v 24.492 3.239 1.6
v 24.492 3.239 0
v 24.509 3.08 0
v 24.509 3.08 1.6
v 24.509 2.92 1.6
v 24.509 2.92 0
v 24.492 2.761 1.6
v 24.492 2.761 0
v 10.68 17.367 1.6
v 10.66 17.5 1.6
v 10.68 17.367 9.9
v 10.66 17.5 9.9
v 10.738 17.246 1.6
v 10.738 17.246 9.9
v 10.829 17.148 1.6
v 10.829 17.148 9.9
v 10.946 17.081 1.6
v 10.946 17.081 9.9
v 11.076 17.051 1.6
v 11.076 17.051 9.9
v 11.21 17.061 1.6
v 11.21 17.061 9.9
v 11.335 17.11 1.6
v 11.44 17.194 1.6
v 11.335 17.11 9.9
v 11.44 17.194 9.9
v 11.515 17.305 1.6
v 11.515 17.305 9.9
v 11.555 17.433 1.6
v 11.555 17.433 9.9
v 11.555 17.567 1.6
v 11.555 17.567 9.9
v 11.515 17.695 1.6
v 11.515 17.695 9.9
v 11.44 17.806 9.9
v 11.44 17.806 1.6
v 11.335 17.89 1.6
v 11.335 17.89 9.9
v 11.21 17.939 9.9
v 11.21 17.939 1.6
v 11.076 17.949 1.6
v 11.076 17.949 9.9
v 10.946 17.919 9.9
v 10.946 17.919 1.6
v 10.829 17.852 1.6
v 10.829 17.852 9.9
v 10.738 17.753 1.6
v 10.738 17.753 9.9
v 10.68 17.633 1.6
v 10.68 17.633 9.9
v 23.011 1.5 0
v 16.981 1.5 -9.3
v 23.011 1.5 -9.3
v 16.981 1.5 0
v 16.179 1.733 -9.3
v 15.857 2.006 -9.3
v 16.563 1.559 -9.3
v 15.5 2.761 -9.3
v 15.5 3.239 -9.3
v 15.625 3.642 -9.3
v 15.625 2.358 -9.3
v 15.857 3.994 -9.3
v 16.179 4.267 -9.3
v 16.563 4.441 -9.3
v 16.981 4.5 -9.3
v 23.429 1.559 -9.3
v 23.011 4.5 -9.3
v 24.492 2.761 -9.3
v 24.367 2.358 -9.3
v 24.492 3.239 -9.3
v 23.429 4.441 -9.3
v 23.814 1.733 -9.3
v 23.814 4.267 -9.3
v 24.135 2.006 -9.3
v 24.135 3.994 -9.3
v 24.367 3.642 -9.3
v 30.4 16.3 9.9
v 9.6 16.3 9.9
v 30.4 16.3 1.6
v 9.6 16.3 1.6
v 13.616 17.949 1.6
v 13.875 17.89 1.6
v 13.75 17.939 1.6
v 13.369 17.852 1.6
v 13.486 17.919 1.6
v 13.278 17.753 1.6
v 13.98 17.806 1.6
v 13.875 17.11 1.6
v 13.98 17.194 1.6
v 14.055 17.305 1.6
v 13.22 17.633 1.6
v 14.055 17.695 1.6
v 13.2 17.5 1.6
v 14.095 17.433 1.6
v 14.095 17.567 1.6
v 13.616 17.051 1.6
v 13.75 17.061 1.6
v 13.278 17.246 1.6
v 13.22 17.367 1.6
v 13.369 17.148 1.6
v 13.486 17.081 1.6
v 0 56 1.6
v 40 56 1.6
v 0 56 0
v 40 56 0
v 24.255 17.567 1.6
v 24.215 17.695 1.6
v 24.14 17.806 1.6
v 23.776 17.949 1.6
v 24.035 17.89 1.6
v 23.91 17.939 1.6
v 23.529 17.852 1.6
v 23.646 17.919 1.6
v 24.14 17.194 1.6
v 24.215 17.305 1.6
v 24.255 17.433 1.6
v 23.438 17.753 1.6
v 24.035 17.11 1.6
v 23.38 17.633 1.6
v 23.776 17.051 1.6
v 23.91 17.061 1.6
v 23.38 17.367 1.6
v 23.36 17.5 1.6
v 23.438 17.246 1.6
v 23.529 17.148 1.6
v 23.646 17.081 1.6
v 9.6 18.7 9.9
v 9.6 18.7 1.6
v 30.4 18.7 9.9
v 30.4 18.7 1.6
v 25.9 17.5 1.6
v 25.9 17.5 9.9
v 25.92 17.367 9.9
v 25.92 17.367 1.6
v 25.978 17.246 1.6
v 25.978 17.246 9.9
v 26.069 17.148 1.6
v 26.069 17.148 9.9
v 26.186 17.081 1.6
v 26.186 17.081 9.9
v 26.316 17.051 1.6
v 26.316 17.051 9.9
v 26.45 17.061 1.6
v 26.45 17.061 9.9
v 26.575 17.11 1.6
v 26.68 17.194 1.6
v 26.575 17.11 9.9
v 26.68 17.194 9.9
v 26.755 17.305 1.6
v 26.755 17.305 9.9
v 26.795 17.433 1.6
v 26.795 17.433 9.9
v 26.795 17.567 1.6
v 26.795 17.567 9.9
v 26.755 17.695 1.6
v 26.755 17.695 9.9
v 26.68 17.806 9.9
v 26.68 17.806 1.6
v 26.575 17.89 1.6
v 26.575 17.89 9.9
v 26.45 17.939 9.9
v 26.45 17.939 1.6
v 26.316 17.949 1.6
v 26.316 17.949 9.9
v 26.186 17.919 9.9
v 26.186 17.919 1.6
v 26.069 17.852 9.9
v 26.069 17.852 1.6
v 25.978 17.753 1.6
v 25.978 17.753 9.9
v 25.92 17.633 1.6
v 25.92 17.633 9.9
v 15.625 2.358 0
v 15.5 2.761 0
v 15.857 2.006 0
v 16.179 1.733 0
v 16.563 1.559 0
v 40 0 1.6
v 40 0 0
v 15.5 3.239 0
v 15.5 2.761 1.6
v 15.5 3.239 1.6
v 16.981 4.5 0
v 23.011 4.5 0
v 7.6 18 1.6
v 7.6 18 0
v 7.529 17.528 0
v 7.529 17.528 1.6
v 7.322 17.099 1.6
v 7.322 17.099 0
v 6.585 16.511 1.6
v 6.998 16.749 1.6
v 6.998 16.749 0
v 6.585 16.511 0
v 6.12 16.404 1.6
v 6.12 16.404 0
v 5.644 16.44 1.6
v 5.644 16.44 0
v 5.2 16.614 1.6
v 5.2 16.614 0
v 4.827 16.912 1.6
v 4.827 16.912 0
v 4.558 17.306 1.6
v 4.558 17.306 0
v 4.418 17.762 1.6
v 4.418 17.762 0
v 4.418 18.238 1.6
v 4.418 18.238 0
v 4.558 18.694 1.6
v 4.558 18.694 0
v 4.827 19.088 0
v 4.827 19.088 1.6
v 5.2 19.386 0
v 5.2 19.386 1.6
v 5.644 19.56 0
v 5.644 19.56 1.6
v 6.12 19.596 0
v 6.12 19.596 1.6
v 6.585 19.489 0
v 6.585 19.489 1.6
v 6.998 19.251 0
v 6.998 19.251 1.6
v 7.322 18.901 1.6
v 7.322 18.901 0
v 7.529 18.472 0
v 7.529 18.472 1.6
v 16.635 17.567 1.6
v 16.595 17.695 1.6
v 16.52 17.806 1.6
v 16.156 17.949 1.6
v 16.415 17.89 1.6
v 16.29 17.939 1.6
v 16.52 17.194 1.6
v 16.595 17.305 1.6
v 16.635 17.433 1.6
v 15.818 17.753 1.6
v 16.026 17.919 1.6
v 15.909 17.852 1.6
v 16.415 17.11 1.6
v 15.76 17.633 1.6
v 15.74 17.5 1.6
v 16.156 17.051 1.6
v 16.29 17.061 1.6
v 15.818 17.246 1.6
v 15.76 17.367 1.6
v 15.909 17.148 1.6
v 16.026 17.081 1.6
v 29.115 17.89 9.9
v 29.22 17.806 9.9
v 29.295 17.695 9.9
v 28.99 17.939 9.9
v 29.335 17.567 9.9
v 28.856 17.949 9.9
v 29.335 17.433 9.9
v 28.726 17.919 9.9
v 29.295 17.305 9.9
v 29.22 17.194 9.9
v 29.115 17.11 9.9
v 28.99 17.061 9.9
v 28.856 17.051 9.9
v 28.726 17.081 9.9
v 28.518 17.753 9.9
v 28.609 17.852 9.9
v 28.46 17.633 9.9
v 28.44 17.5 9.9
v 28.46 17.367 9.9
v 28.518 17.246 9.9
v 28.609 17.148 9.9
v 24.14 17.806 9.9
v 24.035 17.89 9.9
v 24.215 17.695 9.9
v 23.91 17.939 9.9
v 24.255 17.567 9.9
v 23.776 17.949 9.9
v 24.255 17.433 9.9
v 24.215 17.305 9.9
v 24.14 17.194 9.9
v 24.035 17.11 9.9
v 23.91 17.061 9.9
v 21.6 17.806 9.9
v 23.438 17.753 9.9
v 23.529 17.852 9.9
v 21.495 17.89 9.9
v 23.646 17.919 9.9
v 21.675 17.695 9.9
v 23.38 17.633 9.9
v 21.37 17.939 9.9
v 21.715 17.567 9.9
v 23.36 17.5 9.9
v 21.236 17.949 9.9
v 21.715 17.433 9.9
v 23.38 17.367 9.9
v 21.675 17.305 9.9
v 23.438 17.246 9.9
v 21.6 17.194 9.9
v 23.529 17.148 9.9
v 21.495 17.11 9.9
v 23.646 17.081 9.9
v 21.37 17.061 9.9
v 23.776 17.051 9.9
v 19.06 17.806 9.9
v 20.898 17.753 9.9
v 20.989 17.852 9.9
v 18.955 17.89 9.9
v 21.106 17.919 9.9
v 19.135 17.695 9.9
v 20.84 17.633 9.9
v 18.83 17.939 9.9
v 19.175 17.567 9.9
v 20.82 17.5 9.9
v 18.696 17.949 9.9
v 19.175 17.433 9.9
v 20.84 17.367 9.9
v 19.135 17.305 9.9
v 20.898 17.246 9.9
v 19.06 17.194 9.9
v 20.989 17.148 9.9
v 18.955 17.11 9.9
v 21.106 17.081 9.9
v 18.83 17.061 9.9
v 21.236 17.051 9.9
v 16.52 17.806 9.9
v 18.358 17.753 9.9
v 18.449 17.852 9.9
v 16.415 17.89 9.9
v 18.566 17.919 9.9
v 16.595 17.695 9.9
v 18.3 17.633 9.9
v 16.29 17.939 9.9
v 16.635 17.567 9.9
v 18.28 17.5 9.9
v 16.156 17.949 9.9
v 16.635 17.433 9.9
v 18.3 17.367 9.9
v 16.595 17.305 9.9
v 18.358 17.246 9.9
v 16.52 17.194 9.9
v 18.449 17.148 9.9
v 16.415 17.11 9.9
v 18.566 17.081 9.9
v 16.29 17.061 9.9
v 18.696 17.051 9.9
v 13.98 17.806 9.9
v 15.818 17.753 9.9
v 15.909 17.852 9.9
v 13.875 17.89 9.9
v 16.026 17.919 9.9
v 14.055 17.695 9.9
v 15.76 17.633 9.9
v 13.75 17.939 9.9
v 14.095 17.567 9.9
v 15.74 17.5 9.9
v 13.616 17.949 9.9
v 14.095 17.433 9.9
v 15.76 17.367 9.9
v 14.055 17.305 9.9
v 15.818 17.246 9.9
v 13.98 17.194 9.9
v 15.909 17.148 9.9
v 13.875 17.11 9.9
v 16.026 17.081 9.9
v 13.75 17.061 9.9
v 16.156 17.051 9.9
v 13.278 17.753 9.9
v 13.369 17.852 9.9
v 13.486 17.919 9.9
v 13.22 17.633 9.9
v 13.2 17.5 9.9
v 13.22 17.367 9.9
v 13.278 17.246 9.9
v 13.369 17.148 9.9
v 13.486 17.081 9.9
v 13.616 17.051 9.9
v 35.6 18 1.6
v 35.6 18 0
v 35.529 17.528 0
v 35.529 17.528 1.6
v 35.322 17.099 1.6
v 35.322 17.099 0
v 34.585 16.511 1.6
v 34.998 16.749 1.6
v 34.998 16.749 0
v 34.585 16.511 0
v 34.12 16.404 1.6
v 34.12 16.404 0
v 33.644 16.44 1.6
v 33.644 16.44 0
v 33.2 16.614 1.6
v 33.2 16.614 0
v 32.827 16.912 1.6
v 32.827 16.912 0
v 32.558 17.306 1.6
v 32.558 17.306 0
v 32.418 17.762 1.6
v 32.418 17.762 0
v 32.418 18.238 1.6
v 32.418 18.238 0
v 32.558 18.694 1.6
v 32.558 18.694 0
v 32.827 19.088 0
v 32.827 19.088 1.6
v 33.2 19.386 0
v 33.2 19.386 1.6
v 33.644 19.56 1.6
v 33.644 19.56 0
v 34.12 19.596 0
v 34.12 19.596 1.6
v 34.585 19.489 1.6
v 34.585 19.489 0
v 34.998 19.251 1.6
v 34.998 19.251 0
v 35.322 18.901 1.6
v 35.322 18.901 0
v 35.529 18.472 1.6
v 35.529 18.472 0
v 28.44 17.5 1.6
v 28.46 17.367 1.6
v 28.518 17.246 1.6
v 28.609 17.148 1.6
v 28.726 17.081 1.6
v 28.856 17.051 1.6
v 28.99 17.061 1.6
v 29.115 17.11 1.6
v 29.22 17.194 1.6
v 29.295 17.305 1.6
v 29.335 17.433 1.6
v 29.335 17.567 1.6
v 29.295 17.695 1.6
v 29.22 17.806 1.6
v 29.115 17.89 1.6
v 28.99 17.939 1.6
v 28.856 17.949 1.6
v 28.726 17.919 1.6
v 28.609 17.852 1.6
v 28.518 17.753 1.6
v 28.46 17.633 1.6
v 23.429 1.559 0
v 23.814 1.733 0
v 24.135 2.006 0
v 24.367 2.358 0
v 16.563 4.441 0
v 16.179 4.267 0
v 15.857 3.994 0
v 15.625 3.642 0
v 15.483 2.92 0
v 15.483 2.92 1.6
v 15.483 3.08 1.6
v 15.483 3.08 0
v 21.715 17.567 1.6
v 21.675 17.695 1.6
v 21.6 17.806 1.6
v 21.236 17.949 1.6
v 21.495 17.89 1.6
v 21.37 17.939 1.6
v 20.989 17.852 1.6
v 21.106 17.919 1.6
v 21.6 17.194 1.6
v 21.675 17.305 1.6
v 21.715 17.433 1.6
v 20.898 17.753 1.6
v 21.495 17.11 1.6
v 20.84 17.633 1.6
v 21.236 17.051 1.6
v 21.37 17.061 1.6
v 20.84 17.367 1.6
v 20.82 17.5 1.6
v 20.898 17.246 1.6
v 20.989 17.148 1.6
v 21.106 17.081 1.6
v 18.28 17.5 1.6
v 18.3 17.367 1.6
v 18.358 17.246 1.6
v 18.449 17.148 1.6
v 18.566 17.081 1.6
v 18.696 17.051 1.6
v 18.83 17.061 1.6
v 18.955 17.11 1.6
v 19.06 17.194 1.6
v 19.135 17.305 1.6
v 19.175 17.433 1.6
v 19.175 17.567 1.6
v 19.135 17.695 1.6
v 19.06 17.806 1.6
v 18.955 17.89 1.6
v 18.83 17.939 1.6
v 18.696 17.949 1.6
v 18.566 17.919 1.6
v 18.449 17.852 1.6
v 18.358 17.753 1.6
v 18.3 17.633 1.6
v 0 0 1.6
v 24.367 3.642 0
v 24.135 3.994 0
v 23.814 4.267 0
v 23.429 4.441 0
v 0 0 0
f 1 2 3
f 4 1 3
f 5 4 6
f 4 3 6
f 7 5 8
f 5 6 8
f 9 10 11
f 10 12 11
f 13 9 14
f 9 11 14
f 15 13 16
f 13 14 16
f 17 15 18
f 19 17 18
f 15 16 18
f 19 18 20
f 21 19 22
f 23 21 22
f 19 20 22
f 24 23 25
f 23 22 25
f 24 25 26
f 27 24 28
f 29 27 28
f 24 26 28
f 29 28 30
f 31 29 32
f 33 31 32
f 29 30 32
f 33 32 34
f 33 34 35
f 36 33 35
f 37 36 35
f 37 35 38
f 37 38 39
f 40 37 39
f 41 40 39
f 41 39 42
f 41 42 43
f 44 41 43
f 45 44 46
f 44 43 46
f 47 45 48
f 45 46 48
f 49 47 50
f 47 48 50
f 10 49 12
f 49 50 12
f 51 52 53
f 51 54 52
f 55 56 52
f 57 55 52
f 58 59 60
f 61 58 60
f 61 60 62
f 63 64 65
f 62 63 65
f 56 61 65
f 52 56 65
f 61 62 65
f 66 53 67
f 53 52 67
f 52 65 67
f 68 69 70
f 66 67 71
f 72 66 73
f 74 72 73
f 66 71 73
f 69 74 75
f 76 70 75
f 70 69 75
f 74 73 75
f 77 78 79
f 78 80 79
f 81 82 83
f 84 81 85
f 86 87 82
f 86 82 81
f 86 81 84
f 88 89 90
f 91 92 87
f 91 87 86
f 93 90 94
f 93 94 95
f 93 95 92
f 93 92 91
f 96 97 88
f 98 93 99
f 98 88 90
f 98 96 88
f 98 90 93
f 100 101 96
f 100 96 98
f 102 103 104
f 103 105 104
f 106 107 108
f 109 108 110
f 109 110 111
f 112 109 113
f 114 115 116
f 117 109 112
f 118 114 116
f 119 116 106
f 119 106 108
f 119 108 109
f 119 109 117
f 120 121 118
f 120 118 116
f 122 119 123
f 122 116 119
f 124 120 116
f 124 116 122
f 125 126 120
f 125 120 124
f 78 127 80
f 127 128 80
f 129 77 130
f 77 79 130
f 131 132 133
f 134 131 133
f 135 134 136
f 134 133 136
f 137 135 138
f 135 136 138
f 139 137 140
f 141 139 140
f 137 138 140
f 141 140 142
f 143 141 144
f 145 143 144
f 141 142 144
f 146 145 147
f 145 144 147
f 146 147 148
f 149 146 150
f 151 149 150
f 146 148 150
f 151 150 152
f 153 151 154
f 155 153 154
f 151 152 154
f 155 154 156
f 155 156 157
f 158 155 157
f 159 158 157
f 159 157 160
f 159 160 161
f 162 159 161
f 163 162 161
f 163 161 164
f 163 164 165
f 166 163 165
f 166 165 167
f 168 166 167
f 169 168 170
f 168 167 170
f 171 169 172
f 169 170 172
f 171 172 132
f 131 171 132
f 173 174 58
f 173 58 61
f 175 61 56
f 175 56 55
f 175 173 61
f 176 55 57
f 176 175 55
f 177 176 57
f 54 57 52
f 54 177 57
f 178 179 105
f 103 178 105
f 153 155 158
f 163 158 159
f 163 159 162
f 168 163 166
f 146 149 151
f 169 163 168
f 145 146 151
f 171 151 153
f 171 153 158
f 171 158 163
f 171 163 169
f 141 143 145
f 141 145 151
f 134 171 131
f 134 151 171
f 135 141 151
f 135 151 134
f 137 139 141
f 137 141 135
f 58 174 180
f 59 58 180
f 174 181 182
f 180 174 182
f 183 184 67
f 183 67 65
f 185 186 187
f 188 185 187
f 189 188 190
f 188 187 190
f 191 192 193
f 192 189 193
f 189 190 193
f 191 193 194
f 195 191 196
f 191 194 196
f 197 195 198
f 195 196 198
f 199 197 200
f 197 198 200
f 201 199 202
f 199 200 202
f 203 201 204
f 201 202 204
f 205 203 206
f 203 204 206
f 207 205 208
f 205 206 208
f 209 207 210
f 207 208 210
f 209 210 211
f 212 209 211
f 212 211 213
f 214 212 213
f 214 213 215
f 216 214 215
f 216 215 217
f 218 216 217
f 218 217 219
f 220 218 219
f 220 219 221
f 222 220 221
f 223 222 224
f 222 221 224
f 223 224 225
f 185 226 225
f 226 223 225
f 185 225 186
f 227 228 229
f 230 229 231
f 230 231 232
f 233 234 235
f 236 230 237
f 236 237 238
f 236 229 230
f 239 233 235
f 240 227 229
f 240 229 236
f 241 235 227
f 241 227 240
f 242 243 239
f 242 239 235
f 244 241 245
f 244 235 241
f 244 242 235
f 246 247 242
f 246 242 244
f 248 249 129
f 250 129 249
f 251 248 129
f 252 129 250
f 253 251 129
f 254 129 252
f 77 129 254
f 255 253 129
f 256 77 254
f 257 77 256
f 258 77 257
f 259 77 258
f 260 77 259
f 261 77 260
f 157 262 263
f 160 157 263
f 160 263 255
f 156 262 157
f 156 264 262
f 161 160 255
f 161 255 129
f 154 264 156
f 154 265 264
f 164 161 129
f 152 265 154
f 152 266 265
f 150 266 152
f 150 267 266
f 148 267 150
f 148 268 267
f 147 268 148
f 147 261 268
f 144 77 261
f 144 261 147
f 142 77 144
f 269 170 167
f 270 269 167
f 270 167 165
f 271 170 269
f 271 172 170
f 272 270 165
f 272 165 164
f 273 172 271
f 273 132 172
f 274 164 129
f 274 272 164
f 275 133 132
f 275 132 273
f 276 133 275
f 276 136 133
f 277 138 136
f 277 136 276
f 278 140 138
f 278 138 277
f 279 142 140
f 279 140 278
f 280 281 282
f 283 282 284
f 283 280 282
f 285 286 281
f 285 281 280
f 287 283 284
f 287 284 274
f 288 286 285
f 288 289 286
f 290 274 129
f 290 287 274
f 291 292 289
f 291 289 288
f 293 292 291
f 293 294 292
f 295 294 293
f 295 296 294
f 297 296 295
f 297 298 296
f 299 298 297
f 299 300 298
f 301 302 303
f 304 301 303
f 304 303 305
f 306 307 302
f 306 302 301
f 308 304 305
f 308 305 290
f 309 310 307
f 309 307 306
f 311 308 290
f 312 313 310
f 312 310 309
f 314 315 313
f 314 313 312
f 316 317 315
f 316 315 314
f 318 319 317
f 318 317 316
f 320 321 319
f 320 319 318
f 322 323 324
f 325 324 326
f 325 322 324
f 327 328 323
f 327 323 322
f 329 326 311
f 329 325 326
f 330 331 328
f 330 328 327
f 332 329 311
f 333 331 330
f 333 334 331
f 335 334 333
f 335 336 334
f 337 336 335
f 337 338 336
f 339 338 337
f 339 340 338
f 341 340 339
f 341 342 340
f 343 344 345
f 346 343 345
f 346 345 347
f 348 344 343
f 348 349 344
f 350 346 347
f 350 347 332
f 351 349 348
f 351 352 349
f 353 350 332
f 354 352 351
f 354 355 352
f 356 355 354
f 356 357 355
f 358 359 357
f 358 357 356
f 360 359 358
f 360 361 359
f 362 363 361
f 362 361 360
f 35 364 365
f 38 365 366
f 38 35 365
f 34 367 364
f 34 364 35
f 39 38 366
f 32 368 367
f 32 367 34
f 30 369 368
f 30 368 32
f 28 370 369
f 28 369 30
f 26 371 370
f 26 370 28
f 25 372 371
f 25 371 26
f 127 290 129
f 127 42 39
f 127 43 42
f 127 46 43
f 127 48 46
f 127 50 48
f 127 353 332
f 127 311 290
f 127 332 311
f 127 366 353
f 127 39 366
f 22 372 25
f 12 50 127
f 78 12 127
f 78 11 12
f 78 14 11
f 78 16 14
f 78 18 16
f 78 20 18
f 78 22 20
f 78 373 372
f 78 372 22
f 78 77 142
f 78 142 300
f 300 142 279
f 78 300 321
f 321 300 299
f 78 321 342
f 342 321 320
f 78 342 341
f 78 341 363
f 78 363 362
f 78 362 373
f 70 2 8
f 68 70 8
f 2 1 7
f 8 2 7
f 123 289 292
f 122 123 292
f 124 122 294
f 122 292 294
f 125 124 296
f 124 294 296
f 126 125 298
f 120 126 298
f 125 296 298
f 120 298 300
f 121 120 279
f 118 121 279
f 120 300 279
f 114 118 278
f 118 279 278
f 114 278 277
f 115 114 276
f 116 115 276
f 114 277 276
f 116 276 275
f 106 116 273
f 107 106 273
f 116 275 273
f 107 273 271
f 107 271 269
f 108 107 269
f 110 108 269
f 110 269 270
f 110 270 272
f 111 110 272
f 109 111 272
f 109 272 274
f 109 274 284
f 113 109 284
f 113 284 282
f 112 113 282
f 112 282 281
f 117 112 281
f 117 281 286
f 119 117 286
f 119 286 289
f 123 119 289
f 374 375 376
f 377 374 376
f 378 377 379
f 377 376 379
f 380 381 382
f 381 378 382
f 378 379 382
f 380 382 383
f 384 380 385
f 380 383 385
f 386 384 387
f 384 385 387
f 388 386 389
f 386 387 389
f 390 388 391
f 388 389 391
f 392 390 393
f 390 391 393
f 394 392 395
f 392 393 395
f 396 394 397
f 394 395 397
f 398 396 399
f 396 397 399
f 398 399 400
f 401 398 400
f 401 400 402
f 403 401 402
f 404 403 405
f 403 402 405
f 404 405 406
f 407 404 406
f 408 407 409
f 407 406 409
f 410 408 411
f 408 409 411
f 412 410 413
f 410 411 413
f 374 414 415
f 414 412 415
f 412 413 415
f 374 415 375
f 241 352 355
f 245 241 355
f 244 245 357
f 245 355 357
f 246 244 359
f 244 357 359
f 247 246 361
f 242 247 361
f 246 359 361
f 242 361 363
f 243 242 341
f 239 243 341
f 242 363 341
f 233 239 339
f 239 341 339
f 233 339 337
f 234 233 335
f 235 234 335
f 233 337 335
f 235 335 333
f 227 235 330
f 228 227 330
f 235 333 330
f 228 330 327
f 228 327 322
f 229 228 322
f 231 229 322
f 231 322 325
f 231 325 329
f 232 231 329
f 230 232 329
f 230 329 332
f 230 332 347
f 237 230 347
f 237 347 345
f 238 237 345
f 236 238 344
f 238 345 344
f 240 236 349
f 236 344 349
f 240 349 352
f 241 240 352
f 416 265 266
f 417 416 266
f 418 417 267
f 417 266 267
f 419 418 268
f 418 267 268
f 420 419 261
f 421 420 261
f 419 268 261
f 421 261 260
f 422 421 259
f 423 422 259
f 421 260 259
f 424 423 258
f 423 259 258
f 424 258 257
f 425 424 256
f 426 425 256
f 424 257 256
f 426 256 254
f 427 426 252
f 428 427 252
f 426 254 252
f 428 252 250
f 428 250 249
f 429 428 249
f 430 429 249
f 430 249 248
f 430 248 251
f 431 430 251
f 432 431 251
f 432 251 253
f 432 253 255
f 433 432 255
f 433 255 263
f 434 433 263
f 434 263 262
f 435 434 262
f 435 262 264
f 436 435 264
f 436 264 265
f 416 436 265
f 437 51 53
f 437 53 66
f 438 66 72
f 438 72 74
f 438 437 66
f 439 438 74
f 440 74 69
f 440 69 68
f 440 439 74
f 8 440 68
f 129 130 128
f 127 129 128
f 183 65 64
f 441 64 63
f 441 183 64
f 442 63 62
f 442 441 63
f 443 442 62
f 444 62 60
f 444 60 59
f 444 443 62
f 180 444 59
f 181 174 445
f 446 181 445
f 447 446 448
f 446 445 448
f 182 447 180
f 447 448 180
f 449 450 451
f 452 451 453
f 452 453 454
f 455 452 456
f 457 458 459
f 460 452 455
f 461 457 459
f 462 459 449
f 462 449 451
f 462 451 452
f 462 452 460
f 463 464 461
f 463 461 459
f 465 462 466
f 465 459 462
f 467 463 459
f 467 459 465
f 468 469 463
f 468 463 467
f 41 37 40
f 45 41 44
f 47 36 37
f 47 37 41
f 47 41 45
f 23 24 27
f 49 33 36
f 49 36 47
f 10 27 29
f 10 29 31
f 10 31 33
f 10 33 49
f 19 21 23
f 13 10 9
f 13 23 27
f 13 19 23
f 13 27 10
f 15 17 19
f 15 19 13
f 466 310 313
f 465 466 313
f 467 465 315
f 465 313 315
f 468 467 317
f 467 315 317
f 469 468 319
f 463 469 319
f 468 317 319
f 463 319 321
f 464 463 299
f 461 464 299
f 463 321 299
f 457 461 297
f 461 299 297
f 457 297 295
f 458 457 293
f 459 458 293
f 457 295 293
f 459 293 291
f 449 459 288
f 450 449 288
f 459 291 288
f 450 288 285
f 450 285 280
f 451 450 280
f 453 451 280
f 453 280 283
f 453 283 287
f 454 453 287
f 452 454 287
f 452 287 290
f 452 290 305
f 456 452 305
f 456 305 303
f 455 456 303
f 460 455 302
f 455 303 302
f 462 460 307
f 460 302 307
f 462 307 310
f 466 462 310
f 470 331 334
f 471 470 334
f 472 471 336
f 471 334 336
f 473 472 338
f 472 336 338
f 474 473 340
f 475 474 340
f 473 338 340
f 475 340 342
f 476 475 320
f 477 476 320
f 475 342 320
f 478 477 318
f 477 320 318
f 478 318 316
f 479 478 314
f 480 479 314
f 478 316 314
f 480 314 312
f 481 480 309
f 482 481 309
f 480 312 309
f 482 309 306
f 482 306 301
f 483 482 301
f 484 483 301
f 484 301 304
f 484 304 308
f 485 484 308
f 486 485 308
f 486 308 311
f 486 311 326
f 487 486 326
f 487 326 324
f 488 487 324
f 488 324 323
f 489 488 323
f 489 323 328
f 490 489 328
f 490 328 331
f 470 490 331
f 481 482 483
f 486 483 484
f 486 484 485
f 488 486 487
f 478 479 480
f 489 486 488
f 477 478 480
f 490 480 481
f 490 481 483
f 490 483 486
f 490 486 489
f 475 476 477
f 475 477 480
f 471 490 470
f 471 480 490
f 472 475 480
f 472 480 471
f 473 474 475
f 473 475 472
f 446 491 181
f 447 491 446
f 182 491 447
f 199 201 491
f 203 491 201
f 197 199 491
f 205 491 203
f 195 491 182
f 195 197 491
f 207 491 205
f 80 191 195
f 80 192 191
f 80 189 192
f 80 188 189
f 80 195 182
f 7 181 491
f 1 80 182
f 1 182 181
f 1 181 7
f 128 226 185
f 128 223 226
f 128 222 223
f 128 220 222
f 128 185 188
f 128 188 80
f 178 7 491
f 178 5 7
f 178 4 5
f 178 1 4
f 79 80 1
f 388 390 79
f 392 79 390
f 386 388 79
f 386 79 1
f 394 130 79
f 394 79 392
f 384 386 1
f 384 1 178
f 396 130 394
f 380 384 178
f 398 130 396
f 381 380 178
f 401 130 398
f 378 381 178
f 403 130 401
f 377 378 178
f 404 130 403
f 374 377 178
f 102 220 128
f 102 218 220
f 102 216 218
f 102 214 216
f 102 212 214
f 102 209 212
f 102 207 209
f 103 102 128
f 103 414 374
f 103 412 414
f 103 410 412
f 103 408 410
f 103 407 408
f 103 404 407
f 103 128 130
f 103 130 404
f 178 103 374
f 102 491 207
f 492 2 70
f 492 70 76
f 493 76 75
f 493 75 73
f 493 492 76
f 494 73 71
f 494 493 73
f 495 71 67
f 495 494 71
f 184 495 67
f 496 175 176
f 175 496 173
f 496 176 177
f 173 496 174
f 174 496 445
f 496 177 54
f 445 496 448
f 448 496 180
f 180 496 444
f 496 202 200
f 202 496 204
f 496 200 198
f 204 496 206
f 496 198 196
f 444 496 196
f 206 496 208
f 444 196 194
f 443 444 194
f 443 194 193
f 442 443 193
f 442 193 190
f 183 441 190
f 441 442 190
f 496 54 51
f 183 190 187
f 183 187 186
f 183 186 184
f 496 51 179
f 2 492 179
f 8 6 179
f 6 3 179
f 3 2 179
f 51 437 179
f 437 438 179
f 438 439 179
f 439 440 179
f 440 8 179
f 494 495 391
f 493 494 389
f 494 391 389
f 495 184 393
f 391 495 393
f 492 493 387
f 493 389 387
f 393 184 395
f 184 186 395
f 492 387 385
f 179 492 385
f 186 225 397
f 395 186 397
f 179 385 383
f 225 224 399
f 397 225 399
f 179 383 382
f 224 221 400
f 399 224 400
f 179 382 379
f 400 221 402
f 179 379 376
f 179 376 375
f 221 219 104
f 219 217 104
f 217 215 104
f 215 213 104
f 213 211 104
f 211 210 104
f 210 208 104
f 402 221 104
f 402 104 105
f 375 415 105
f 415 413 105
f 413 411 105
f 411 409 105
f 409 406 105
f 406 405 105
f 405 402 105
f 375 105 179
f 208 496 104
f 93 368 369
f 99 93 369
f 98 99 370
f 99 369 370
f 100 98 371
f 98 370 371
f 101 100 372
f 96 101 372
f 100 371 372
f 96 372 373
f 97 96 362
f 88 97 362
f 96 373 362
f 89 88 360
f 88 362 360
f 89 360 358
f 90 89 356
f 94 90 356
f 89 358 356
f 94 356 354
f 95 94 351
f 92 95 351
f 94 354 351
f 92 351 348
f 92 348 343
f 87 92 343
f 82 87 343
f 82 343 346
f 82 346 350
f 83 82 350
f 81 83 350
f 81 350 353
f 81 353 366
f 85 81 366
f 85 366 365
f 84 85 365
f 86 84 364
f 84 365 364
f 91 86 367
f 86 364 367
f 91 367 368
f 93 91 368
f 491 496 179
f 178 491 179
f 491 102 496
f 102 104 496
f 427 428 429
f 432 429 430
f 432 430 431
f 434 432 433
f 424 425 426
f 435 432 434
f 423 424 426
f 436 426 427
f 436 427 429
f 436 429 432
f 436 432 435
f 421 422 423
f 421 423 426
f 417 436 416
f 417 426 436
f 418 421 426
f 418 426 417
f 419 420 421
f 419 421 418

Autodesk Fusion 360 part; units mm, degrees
sketch "Skizze7" plane through (0, 0, 0) normal (0, 0, 1) x (1, 0, 0)
  line L0 (40, 0) -> (40, 56)
  line L1 (0, 0) -> (40, 0)
  line L2 (0, 56) -> (0, 0)
  line L3 (40, 56) -> (0, 56)
  line L4 (19.1939, 4.7) -> (20.8061, 4.7)
  line L5 (20.8061, 1.3) -> (19.1939, 1.3)
  line L6 (24.4922, 4.7) -> (24.4922, 1.3)
  line L7 (15.5, 1.3) -> (15.5, 4.7)
  line L8 (30.4001, 18.6999) -> (9.5999, 18.6999)
  line L9 (30.4001, 16.2998) -> (30.4001, 18.6999)
  line L10 (9.5999, 18.6999) -> (9.5999, 16.2998)
  line L11 (9.5999, 16.2998) -> (30.4001, 16.2998)
  circle A0 centre (34, 18) radius 1.6
  circle A1 centre (6, 18) radius 1.6
  line L12 (15.5, 3) -> (24.4922, 3) construction
  line L13 (20, 4.7) -> (20, 1.3) construction
  line L14 (16.9808, 1.5) -> (23.0114, 1.5)
  arc A2 (23.0114, 1.5) -> (23.0114, 4.5) centre (23.0114, 3) ccw
  line L15 (23.0114, 4.5) -> (16.9808, 4.5)
  arc A3 (16.9808, 4.5) -> (16.9808, 1.5) centre (16.9808, 3) ccw
  line L16 (16.9808, 3) -> (23.0114, 3) construction
  point P0 (19.9961, 3)
  dimension "d25" = 3
extrude "Extrusion10" add sketch "Skizze7" along normal blind 1.6 contours L0 L1 L2 L3 | L6 L7 L14 A2 L15 A3 | L8 L9 L10 L11
extrude "Extrusion11" add sketch "Skizze7" against normal blind 9.3 contours L6 L7 L14 A2 L15 A3
sketch "Skizze8" plane through (0, 0, 1.6) normal (0, 0, 1) x (-1, 0, 0)
  line L0 (-15.5, -3.2394) -> (-15.5, -2.7606)
  arc A0 (-15.5, -3.2394) -> (-15.5, -2.7606) centre (-16.9808, -3) ccw
  circle A1 centre (-6, -18) radius 1.6
  line L1 (-24.4922, -2.7606) -> (-24.4922, -3.2394)
  arc A2 (-24.4922, -2.7606) -> (-24.4922, -3.2394) centre (-23.0114, -3) ccw
  circle A3 centre (-34, -18) radius 1.6
  line L2 (-40, -56) -> (0, -56)
  line L3 (0, -56) -> (0, 0)
  line L4 (0, 0) -> (-40, 0)
  line L5 (-40, 0) -> (-40, -56)
  line L6 (-9.5999, -16.2998) -> (-30.4001, -16.2998)
  line L7 (-30.4001, -18.6999) -> (-9.5999, -18.6999)
  line L8 (-30.4001, -16.2998) -> (-30.4001, -18.6999)
  line L9 (-9.5999, -18.6999) -> (-9.5999, -16.2998)
extrude "Extrusion12" add sketch "Skizze8" along normal blind 8.3 contours L6 L7 L8 L9
sketch "Skizze9" plane through (0, 0, 9.9) normal (0, 0, 1) x (-1, 0, 0)
  line L0 (-9.5999, -18.6999) -> (-9.5999, -16.2998)
  line L1 (-9.5999, -16.2998) -> (-30.4001, -16.2998)
  line L2 (-30.4001, -16.2998) -> (-30.4001, -18.6999)
  line L3 (-30.4001, -18.6999) -> (-9.5999, -18.6999)
  line L4 (-30.4001, -17.4999) -> (-9.5999, -17.4999) construction
  circle A0 centre (-28.89, -17.4999) radius 0.45
  circle A1 centre (-26.35, -17.4999) radius 0.45
  circle A2 centre (-23.81, -17.4999) radius 0.45
  circle A3 centre (-21.27, -17.4999) radius 0.45
  circle A4 centre (-18.73, -17.4999) radius 0.45
  circle A5 centre (-16.19, -17.4999) radius 0.45
  circle A6 centre (-13.65, -17.4999) radius 0.45
  circle A7 centre (-11.11, -17.4999) radius 0.45
  dimension "d32" = 0.9
  dimension "d35" = 2.54
  dimension "d36" = 0
  dimension "d37" = 1.5101
  dimension "d38" = 1.5101
extrude "Extrusion13" cut sketch "Skizze9" against normal up to surface (8.3 mm away) contours A0 | A1 | A2 | A3 | A4 | A5 | A6 | A7
equation "d37 = d38"
